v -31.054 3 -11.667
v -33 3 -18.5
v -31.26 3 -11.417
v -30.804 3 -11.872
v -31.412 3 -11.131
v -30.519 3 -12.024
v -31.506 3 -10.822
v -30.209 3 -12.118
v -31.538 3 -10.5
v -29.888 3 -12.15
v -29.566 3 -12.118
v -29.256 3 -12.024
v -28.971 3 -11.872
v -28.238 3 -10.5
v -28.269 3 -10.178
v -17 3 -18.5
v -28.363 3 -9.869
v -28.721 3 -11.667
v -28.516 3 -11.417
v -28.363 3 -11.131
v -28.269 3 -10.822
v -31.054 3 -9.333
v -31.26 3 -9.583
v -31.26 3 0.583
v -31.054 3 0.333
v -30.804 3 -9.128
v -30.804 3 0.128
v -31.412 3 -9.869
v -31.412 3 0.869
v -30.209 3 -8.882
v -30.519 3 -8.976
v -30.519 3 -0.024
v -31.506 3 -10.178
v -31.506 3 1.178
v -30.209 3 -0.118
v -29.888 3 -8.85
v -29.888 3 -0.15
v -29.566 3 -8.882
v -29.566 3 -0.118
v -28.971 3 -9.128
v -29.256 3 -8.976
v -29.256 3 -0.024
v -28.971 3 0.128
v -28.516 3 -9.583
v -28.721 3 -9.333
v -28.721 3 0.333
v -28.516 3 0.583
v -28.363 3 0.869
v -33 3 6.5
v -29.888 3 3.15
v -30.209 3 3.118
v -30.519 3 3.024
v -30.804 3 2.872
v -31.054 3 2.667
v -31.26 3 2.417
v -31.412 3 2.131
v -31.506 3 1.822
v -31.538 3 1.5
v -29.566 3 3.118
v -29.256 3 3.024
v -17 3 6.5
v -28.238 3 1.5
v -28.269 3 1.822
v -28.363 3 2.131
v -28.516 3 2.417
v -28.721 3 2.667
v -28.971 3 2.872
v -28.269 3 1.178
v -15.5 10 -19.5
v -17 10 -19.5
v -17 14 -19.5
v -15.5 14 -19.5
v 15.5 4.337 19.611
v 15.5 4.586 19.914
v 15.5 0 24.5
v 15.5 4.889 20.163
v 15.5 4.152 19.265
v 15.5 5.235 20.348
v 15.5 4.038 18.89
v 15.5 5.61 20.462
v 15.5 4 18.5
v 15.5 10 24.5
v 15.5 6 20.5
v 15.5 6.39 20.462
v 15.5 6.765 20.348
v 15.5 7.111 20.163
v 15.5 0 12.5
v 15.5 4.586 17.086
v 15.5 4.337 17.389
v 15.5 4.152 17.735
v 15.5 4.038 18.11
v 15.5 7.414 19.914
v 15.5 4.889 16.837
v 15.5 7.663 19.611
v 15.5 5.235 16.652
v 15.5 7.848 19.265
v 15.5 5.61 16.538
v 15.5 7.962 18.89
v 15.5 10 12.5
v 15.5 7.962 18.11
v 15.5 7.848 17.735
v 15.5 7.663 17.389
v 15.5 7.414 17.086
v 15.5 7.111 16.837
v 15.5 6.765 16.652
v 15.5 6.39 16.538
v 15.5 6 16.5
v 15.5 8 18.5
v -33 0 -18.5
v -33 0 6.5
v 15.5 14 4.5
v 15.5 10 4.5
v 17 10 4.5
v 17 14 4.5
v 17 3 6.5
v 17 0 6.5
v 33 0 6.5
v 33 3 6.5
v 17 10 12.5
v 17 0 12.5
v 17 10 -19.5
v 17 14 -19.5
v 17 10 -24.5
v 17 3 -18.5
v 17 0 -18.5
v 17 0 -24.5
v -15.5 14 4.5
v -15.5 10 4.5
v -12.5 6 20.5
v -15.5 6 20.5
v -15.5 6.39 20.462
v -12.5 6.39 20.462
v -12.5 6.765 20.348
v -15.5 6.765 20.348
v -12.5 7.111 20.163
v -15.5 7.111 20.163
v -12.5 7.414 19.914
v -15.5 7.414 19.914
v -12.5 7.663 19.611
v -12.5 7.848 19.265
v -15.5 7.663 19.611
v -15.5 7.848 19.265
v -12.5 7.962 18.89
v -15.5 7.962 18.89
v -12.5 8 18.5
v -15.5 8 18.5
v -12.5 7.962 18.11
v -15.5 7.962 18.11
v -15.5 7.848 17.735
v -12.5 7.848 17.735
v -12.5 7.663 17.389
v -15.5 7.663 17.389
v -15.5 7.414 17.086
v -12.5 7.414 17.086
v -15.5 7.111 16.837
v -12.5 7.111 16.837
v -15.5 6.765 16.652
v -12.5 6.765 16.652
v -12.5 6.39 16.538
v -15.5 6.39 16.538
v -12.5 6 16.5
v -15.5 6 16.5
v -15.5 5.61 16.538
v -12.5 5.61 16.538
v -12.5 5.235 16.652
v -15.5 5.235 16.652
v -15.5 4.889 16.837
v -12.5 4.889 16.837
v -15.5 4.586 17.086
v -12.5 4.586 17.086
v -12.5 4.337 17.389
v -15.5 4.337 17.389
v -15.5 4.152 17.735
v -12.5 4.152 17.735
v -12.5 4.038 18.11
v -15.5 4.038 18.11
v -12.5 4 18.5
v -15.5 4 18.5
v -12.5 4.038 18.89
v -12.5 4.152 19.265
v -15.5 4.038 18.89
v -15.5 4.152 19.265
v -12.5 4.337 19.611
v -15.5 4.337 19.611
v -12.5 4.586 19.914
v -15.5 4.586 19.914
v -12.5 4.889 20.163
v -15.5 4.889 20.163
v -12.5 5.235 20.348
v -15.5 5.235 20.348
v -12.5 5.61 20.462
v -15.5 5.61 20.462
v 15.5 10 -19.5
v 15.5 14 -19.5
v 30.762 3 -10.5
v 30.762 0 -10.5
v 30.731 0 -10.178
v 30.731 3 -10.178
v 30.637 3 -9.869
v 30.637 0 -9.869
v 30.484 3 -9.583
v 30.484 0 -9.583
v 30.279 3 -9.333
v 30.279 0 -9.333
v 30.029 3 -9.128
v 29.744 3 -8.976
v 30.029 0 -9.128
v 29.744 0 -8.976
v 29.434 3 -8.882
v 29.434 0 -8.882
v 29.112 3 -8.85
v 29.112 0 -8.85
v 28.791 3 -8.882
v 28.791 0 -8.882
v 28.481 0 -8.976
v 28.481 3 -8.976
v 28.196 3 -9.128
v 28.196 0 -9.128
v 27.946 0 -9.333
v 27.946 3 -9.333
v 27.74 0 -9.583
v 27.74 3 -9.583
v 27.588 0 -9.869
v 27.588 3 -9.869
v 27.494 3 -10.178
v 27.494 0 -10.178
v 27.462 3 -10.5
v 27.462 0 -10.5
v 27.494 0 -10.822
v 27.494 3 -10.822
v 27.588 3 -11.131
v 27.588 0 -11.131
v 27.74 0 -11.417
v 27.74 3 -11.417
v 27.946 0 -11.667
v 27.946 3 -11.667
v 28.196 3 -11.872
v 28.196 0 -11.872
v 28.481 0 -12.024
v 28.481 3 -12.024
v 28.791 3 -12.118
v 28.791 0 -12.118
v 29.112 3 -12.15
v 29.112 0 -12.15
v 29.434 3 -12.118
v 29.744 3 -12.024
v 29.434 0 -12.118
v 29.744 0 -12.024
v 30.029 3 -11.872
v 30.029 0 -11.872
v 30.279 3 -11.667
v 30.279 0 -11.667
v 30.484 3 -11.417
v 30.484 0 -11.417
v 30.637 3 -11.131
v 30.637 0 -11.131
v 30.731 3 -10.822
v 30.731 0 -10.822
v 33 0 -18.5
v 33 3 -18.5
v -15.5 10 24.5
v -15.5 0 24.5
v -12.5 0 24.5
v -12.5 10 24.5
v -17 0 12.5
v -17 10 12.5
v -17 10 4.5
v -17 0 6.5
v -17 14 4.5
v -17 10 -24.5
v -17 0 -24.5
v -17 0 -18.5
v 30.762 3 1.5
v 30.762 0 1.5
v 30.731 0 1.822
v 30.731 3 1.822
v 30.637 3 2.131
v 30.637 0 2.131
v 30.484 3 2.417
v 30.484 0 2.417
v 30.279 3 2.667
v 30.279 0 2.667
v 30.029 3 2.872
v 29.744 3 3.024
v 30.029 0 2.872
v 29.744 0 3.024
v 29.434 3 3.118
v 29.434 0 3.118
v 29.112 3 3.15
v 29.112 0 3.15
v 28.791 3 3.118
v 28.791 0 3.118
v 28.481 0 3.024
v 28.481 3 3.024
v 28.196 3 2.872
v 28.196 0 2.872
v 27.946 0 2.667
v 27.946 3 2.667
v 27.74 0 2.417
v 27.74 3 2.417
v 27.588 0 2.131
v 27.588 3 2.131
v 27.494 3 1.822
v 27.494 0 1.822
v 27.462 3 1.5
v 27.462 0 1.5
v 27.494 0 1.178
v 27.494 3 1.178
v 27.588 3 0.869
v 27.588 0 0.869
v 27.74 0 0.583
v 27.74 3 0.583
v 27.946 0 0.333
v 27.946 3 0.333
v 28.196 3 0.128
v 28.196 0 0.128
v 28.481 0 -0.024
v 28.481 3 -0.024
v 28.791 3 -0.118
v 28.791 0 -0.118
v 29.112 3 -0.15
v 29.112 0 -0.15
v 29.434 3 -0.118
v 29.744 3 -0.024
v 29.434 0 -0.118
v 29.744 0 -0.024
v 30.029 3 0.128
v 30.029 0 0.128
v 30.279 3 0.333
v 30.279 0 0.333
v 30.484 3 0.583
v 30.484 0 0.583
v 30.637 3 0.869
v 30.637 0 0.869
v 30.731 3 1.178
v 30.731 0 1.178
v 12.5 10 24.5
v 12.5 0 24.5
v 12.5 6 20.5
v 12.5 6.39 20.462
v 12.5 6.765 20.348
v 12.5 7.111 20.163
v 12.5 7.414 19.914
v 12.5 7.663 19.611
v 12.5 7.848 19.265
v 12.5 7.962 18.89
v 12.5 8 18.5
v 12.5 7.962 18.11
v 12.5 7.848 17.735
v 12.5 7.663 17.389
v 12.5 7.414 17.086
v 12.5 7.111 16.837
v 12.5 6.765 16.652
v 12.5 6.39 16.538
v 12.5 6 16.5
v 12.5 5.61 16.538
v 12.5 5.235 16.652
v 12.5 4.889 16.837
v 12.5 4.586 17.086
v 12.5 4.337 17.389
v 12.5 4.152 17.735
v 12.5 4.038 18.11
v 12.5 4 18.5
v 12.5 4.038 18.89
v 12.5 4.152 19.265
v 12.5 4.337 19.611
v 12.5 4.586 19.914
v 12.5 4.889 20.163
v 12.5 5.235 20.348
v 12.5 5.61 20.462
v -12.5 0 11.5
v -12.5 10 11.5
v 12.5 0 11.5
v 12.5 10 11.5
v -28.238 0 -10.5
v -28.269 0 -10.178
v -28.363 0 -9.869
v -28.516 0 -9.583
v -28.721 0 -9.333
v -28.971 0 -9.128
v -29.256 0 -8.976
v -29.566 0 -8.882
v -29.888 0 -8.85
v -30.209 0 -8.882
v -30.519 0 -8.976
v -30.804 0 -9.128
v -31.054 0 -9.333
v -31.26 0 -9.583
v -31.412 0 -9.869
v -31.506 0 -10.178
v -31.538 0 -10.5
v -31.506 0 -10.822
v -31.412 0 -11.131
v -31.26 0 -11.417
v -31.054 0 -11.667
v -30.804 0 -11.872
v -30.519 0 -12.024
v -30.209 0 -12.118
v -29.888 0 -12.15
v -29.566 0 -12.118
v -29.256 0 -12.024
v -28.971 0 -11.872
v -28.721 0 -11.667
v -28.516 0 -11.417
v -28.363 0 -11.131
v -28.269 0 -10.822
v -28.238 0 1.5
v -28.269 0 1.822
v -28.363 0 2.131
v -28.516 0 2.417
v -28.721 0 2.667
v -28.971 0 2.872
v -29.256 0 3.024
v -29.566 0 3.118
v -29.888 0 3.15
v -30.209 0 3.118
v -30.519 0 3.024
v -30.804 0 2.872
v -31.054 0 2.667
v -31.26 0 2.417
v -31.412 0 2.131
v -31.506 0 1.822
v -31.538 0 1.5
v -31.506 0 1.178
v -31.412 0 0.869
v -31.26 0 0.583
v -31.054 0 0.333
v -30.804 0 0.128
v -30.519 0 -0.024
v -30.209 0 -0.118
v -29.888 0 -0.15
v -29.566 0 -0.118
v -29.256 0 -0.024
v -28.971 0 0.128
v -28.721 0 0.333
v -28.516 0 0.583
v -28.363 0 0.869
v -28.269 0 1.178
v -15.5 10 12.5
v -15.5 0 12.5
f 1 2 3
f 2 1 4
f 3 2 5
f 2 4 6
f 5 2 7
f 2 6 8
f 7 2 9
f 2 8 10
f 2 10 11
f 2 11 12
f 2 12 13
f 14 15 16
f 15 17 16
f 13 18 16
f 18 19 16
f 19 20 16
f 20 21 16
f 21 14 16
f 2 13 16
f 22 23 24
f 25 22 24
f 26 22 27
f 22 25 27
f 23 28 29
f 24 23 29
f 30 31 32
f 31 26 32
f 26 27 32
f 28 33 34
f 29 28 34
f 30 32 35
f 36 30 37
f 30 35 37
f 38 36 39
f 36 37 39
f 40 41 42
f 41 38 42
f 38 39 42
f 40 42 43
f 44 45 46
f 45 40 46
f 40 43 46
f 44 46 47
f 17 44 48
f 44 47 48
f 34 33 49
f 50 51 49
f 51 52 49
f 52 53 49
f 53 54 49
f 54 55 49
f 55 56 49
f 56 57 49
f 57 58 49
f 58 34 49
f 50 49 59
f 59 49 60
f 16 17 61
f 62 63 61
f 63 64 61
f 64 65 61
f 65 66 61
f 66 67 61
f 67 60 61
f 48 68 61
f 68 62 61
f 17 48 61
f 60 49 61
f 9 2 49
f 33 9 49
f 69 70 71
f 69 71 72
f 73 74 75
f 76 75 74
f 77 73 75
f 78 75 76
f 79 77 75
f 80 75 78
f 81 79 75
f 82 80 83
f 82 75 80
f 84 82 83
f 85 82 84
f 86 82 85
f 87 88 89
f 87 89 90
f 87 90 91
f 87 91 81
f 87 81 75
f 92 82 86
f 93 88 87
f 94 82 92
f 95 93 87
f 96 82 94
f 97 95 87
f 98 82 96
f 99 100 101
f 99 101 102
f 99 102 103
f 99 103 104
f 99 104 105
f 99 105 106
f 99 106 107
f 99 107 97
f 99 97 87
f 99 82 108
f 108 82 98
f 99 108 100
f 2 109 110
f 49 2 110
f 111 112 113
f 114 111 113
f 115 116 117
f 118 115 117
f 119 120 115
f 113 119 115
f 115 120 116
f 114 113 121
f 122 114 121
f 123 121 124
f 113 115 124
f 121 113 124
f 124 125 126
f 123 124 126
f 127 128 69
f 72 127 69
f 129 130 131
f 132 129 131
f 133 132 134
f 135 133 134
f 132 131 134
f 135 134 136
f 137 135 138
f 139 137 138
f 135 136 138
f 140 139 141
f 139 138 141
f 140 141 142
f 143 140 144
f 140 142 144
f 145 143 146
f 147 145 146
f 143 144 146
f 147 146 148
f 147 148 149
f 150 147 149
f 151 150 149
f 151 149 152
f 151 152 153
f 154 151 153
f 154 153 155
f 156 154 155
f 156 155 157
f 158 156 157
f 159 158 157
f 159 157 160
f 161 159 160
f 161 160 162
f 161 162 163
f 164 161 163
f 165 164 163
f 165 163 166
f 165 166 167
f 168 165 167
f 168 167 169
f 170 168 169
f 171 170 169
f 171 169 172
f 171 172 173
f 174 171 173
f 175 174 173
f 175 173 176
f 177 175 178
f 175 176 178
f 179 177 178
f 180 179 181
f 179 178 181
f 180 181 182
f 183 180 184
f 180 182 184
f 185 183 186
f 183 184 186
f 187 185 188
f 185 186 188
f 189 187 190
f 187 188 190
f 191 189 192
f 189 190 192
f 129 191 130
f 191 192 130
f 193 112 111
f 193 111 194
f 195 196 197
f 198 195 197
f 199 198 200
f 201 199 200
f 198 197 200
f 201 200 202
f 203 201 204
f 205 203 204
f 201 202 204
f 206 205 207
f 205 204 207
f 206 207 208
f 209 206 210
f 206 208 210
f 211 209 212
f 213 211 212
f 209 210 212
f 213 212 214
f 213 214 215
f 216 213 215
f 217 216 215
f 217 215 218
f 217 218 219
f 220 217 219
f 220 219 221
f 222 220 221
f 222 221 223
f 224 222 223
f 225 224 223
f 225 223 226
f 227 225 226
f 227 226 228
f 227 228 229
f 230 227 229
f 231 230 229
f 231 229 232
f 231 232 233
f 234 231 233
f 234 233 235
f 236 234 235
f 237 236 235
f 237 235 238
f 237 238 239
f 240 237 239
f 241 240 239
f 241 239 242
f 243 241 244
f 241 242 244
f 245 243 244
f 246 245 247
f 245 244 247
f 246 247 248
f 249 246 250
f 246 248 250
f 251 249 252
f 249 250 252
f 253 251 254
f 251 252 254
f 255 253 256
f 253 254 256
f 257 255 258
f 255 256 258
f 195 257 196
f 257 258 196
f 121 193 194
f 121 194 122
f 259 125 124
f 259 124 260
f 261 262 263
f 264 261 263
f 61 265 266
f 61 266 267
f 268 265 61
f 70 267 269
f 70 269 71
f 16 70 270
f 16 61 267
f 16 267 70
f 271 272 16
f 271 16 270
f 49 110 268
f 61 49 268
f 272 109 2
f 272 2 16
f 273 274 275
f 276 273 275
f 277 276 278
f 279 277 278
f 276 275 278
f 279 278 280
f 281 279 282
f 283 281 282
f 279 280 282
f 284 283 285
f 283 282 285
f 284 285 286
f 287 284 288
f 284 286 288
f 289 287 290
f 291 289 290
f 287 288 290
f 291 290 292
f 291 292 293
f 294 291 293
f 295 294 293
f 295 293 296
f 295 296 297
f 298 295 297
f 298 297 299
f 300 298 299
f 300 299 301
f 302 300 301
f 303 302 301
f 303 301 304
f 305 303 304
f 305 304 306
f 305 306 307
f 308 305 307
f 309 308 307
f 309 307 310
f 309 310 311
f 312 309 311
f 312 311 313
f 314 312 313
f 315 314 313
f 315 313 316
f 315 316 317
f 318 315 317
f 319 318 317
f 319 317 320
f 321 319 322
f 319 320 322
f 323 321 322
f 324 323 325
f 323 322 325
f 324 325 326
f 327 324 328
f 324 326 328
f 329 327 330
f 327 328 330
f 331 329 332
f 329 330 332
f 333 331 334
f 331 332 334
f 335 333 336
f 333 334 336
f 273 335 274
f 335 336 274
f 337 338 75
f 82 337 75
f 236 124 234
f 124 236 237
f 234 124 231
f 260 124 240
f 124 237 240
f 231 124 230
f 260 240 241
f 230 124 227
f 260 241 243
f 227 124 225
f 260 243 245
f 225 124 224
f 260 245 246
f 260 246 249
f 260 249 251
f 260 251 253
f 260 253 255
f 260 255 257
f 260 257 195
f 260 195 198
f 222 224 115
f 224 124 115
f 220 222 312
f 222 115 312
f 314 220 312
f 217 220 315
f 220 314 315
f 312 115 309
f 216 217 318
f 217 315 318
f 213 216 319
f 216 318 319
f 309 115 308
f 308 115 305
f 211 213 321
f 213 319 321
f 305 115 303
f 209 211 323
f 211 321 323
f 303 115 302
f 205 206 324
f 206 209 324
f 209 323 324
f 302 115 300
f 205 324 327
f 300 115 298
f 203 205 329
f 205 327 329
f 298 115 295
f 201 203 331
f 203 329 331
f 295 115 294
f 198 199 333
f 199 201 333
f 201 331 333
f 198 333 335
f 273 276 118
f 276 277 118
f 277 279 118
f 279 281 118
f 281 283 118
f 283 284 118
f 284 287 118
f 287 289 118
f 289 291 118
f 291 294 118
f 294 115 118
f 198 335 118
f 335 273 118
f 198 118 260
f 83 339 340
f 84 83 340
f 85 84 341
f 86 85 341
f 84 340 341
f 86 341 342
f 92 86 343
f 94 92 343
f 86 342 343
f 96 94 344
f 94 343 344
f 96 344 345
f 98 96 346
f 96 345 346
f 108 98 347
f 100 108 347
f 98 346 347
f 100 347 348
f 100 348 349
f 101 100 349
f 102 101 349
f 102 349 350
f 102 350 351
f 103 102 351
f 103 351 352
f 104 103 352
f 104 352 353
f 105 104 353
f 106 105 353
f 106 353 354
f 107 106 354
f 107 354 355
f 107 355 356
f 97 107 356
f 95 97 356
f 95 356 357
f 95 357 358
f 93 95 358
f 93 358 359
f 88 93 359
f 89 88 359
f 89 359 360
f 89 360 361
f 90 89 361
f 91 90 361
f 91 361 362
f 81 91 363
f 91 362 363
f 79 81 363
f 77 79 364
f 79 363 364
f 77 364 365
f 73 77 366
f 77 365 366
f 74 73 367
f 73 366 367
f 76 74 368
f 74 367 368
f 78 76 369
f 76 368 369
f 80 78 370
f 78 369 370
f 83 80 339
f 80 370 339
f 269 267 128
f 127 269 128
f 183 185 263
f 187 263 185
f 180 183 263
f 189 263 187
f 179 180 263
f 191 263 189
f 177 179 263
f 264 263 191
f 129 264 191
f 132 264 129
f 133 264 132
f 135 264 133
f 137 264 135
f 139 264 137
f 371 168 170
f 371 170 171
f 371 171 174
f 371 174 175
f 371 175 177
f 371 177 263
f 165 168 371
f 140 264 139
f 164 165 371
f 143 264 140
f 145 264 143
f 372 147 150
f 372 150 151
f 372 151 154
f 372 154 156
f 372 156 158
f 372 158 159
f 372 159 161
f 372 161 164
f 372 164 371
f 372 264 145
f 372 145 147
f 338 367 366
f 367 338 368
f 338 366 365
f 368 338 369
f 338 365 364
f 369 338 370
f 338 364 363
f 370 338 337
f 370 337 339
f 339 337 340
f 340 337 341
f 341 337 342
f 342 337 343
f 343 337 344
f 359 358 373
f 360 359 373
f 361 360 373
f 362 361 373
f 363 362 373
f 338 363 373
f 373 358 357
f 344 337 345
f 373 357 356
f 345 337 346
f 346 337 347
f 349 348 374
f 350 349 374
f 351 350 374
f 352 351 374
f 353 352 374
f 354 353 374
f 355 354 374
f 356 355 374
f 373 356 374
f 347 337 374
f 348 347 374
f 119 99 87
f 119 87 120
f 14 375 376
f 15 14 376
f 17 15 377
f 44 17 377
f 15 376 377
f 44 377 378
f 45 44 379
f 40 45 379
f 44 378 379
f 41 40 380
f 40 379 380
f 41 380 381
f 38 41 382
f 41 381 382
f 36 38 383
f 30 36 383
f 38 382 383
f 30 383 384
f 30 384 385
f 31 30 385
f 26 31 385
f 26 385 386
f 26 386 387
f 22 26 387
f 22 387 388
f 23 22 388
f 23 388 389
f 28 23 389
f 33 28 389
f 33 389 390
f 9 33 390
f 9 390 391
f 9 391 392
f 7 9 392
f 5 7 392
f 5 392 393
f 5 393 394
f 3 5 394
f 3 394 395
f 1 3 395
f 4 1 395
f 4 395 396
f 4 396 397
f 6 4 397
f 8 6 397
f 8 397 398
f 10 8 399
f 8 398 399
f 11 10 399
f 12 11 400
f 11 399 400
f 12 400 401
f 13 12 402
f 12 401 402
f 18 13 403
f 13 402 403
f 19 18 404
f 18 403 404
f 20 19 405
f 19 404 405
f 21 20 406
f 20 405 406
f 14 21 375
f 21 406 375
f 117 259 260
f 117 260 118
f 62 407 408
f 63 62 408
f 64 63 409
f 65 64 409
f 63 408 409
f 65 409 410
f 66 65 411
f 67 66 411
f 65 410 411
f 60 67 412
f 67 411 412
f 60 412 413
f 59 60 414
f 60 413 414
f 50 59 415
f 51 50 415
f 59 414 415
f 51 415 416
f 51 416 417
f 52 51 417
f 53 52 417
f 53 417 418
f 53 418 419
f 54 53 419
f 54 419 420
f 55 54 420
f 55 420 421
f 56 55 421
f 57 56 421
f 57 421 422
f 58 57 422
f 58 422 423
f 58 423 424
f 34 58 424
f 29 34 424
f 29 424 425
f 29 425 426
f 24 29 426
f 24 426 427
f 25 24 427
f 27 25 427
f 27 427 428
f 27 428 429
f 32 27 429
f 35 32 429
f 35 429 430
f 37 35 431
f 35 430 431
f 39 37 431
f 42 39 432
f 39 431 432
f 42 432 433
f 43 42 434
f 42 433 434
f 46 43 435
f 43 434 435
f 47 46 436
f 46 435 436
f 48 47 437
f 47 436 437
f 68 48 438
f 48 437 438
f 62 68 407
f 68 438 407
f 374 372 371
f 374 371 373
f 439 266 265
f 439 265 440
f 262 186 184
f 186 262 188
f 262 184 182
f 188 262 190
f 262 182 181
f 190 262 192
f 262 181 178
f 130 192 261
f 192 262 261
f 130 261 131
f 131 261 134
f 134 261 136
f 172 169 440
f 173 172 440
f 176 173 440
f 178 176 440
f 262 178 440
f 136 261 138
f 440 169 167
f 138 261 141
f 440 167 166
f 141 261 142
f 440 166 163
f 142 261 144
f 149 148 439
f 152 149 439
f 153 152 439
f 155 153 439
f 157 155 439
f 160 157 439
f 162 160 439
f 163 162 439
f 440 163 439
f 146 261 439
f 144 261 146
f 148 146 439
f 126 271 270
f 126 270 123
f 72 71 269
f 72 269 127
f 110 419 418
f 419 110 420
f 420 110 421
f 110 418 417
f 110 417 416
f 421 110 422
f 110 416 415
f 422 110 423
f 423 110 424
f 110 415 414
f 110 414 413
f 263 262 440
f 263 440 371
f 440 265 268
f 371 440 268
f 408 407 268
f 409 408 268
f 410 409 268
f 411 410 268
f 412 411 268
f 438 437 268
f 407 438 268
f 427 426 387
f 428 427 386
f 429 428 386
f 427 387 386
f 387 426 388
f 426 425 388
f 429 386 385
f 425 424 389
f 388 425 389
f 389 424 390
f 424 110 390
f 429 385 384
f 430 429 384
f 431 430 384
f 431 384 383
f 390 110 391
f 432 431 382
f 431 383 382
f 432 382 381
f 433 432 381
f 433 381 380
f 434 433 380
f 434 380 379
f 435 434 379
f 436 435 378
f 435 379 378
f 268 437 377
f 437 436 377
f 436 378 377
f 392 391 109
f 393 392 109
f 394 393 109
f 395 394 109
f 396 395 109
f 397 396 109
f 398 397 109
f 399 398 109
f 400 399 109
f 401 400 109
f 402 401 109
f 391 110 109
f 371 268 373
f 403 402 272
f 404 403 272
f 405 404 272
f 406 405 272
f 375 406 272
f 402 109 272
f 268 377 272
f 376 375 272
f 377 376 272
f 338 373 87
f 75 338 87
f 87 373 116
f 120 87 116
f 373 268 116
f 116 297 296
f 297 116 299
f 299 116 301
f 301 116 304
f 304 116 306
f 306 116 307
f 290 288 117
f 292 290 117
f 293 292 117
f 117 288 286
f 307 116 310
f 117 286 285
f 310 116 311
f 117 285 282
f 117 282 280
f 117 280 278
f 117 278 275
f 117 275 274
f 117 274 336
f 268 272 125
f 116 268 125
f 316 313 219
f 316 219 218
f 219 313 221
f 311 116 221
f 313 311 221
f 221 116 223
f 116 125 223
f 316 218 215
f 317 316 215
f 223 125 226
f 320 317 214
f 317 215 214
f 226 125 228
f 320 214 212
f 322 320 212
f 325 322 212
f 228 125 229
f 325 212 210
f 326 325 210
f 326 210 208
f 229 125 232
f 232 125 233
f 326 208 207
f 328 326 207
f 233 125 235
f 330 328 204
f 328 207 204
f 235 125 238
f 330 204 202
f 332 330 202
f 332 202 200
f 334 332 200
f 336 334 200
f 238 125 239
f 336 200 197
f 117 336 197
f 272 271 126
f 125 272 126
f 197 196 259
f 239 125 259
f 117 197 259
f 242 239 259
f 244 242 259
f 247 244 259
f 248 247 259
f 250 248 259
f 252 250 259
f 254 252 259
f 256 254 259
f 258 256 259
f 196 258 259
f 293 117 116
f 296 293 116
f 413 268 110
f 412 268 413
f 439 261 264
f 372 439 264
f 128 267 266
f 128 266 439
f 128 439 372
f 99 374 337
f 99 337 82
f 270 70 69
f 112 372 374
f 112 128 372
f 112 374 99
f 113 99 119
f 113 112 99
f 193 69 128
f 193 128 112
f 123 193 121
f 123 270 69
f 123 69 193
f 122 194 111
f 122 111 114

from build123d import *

# Parameters (mm, degrees)
SKETCH_1_W          = 34
SKETCH_1_H          = 49
EXTRUDE_1_DEPTH     = 10
SKETCH_2_W          = 1.5
SKETCH_2_H          = 24
EXTRUDE_2_DEPTH     = 4
SKETCH_3_W          = 1.5
SKETCH_3_H          = 12
SKETCH_3_W_2        = 25
SKETCH_3_H_2        = 13
CUT_EXTRUDE_1_DEPTH = 10
SKETCH_4_R          = 2
CUT_EXTRUDE_2_DEPTH = 31
EXTRUDE_3_DEPTH     = 8
CUT_EXTRUDE_4_DEPTH = 10
SKETCH_6_W          = 16
SKETCH_6_H          = 25
EXTRUDE_4_DEPTH     = 3
SKETCH_7_R          = 1.65
CUT_EXTRUDE_5_DEPTH = 8


with BuildPart() as part:
    # 草图1 → 凸台-拉伸1 (new body)
    with BuildSketch(Plane(origin=(0, 0, 0), x_dir=(1, 0, 0), z_dir=(0, 1, 0))):
        Rectangle(SKETCH_1_W, SKETCH_1_H)
    extrude(amount=EXTRUDE_1_DEPTH)

    # 草图2 → 凸台-拉伸2 (add)
    with BuildSketch(Plane(origin=(0, 10, 0), x_dir=(1, 0, 0), z_dir=(0, 1, 0))):
        with Locations((-16.25, 7.5)):
            Rectangle(SKETCH_2_W, SKETCH_2_H)
        with Locations((16.25, 7.5)):
            Rectangle(SKETCH_2_W, SKETCH_2_H)
    extrude(amount=EXTRUDE_2_DEPTH)

    # 草图3 → 切除-拉伸1 (cut)
    with BuildSketch(Plane(origin=(0, 10, 0), x_dir=(1, 0, 0), z_dir=(0, 1, 0))):
        with Locations((-16.25, -18.5)):
            Rectangle(SKETCH_3_W, SKETCH_3_H)
        with Locations((16.25, -18.5)):
            Rectangle(SKETCH_3_W, SKETCH_3_H)
        with Locations((0, -18)):
            Rectangle(SKETCH_3_W_2, SKETCH_3_H_2)
    extrude(amount=-CUT_EXTRUDE_1_DEPTH, mode=Mode.SUBTRACT)

    # 草图4 → 切除-拉伸2 (cut)
    with BuildSketch(Plane.ZY.offset(15.5)):
        with Locations((18.5, 6)):
            Circle(SKETCH_4_R)
    extrude(amount=-CUT_EXTRUDE_2_DEPTH, mode=Mode.SUBTRACT)

    # 草图5 → 凸台-拉伸3 (add)
    with BuildSketch(Plane.XZ):
        Polygon((4, 11.5), (-4, 11.5), (-4, 41.5), (-13, 41.5), (-13, 56.5), (13, 56.5), (13, 41.5), (4, 41.5), align=None)
    extrude(amount=-EXTRUDE_3_DEPTH)

    # 草图5<2> → 切除-拉伸4 (cut)
    with BuildSketch(Plane.XZ):
        Polygon((4, 11.5), (-4, 11.5), (-4, 41.5), (-13, 41.5), (-13, 56.5), (13, 56.5), (13, 41.5), (4, 41.5), align=None)
    extrude(amount=-CUT_EXTRUDE_4_DEPTH, mode=Mode.SUBTRACT)

    # 草图6 → 凸台-拉伸4 (add)
    with BuildSketch(Plane.XZ):
        with Locations((25, -6)):
            Rectangle(SKETCH_6_W, SKETCH_6_H)
        with Locations((-25, -6)):
            Rectangle(SKETCH_6_W, SKETCH_6_H)
    extrude(amount=-EXTRUDE_4_DEPTH)

    # 草图7 → 切除-拉伸5 (cut)
    with BuildSketch(Plane.XZ):
        with Locations((29.112405101, 1.5)):
            Circle(SKETCH_7_R)
        with Locations((29.112405101, -10.5)):
            Circle(SKETCH_7_R)
        with Locations((-29.887594899, 1.5)):
            Circle(SKETCH_7_R)
        with Locations((-29.887594899, -10.5)):
            Circle(SKETCH_7_R)
    extrude(amount=-CUT_EXTRUDE_5_DEPTH, mode=Mode.SUBTRACT)


solid = part.part
